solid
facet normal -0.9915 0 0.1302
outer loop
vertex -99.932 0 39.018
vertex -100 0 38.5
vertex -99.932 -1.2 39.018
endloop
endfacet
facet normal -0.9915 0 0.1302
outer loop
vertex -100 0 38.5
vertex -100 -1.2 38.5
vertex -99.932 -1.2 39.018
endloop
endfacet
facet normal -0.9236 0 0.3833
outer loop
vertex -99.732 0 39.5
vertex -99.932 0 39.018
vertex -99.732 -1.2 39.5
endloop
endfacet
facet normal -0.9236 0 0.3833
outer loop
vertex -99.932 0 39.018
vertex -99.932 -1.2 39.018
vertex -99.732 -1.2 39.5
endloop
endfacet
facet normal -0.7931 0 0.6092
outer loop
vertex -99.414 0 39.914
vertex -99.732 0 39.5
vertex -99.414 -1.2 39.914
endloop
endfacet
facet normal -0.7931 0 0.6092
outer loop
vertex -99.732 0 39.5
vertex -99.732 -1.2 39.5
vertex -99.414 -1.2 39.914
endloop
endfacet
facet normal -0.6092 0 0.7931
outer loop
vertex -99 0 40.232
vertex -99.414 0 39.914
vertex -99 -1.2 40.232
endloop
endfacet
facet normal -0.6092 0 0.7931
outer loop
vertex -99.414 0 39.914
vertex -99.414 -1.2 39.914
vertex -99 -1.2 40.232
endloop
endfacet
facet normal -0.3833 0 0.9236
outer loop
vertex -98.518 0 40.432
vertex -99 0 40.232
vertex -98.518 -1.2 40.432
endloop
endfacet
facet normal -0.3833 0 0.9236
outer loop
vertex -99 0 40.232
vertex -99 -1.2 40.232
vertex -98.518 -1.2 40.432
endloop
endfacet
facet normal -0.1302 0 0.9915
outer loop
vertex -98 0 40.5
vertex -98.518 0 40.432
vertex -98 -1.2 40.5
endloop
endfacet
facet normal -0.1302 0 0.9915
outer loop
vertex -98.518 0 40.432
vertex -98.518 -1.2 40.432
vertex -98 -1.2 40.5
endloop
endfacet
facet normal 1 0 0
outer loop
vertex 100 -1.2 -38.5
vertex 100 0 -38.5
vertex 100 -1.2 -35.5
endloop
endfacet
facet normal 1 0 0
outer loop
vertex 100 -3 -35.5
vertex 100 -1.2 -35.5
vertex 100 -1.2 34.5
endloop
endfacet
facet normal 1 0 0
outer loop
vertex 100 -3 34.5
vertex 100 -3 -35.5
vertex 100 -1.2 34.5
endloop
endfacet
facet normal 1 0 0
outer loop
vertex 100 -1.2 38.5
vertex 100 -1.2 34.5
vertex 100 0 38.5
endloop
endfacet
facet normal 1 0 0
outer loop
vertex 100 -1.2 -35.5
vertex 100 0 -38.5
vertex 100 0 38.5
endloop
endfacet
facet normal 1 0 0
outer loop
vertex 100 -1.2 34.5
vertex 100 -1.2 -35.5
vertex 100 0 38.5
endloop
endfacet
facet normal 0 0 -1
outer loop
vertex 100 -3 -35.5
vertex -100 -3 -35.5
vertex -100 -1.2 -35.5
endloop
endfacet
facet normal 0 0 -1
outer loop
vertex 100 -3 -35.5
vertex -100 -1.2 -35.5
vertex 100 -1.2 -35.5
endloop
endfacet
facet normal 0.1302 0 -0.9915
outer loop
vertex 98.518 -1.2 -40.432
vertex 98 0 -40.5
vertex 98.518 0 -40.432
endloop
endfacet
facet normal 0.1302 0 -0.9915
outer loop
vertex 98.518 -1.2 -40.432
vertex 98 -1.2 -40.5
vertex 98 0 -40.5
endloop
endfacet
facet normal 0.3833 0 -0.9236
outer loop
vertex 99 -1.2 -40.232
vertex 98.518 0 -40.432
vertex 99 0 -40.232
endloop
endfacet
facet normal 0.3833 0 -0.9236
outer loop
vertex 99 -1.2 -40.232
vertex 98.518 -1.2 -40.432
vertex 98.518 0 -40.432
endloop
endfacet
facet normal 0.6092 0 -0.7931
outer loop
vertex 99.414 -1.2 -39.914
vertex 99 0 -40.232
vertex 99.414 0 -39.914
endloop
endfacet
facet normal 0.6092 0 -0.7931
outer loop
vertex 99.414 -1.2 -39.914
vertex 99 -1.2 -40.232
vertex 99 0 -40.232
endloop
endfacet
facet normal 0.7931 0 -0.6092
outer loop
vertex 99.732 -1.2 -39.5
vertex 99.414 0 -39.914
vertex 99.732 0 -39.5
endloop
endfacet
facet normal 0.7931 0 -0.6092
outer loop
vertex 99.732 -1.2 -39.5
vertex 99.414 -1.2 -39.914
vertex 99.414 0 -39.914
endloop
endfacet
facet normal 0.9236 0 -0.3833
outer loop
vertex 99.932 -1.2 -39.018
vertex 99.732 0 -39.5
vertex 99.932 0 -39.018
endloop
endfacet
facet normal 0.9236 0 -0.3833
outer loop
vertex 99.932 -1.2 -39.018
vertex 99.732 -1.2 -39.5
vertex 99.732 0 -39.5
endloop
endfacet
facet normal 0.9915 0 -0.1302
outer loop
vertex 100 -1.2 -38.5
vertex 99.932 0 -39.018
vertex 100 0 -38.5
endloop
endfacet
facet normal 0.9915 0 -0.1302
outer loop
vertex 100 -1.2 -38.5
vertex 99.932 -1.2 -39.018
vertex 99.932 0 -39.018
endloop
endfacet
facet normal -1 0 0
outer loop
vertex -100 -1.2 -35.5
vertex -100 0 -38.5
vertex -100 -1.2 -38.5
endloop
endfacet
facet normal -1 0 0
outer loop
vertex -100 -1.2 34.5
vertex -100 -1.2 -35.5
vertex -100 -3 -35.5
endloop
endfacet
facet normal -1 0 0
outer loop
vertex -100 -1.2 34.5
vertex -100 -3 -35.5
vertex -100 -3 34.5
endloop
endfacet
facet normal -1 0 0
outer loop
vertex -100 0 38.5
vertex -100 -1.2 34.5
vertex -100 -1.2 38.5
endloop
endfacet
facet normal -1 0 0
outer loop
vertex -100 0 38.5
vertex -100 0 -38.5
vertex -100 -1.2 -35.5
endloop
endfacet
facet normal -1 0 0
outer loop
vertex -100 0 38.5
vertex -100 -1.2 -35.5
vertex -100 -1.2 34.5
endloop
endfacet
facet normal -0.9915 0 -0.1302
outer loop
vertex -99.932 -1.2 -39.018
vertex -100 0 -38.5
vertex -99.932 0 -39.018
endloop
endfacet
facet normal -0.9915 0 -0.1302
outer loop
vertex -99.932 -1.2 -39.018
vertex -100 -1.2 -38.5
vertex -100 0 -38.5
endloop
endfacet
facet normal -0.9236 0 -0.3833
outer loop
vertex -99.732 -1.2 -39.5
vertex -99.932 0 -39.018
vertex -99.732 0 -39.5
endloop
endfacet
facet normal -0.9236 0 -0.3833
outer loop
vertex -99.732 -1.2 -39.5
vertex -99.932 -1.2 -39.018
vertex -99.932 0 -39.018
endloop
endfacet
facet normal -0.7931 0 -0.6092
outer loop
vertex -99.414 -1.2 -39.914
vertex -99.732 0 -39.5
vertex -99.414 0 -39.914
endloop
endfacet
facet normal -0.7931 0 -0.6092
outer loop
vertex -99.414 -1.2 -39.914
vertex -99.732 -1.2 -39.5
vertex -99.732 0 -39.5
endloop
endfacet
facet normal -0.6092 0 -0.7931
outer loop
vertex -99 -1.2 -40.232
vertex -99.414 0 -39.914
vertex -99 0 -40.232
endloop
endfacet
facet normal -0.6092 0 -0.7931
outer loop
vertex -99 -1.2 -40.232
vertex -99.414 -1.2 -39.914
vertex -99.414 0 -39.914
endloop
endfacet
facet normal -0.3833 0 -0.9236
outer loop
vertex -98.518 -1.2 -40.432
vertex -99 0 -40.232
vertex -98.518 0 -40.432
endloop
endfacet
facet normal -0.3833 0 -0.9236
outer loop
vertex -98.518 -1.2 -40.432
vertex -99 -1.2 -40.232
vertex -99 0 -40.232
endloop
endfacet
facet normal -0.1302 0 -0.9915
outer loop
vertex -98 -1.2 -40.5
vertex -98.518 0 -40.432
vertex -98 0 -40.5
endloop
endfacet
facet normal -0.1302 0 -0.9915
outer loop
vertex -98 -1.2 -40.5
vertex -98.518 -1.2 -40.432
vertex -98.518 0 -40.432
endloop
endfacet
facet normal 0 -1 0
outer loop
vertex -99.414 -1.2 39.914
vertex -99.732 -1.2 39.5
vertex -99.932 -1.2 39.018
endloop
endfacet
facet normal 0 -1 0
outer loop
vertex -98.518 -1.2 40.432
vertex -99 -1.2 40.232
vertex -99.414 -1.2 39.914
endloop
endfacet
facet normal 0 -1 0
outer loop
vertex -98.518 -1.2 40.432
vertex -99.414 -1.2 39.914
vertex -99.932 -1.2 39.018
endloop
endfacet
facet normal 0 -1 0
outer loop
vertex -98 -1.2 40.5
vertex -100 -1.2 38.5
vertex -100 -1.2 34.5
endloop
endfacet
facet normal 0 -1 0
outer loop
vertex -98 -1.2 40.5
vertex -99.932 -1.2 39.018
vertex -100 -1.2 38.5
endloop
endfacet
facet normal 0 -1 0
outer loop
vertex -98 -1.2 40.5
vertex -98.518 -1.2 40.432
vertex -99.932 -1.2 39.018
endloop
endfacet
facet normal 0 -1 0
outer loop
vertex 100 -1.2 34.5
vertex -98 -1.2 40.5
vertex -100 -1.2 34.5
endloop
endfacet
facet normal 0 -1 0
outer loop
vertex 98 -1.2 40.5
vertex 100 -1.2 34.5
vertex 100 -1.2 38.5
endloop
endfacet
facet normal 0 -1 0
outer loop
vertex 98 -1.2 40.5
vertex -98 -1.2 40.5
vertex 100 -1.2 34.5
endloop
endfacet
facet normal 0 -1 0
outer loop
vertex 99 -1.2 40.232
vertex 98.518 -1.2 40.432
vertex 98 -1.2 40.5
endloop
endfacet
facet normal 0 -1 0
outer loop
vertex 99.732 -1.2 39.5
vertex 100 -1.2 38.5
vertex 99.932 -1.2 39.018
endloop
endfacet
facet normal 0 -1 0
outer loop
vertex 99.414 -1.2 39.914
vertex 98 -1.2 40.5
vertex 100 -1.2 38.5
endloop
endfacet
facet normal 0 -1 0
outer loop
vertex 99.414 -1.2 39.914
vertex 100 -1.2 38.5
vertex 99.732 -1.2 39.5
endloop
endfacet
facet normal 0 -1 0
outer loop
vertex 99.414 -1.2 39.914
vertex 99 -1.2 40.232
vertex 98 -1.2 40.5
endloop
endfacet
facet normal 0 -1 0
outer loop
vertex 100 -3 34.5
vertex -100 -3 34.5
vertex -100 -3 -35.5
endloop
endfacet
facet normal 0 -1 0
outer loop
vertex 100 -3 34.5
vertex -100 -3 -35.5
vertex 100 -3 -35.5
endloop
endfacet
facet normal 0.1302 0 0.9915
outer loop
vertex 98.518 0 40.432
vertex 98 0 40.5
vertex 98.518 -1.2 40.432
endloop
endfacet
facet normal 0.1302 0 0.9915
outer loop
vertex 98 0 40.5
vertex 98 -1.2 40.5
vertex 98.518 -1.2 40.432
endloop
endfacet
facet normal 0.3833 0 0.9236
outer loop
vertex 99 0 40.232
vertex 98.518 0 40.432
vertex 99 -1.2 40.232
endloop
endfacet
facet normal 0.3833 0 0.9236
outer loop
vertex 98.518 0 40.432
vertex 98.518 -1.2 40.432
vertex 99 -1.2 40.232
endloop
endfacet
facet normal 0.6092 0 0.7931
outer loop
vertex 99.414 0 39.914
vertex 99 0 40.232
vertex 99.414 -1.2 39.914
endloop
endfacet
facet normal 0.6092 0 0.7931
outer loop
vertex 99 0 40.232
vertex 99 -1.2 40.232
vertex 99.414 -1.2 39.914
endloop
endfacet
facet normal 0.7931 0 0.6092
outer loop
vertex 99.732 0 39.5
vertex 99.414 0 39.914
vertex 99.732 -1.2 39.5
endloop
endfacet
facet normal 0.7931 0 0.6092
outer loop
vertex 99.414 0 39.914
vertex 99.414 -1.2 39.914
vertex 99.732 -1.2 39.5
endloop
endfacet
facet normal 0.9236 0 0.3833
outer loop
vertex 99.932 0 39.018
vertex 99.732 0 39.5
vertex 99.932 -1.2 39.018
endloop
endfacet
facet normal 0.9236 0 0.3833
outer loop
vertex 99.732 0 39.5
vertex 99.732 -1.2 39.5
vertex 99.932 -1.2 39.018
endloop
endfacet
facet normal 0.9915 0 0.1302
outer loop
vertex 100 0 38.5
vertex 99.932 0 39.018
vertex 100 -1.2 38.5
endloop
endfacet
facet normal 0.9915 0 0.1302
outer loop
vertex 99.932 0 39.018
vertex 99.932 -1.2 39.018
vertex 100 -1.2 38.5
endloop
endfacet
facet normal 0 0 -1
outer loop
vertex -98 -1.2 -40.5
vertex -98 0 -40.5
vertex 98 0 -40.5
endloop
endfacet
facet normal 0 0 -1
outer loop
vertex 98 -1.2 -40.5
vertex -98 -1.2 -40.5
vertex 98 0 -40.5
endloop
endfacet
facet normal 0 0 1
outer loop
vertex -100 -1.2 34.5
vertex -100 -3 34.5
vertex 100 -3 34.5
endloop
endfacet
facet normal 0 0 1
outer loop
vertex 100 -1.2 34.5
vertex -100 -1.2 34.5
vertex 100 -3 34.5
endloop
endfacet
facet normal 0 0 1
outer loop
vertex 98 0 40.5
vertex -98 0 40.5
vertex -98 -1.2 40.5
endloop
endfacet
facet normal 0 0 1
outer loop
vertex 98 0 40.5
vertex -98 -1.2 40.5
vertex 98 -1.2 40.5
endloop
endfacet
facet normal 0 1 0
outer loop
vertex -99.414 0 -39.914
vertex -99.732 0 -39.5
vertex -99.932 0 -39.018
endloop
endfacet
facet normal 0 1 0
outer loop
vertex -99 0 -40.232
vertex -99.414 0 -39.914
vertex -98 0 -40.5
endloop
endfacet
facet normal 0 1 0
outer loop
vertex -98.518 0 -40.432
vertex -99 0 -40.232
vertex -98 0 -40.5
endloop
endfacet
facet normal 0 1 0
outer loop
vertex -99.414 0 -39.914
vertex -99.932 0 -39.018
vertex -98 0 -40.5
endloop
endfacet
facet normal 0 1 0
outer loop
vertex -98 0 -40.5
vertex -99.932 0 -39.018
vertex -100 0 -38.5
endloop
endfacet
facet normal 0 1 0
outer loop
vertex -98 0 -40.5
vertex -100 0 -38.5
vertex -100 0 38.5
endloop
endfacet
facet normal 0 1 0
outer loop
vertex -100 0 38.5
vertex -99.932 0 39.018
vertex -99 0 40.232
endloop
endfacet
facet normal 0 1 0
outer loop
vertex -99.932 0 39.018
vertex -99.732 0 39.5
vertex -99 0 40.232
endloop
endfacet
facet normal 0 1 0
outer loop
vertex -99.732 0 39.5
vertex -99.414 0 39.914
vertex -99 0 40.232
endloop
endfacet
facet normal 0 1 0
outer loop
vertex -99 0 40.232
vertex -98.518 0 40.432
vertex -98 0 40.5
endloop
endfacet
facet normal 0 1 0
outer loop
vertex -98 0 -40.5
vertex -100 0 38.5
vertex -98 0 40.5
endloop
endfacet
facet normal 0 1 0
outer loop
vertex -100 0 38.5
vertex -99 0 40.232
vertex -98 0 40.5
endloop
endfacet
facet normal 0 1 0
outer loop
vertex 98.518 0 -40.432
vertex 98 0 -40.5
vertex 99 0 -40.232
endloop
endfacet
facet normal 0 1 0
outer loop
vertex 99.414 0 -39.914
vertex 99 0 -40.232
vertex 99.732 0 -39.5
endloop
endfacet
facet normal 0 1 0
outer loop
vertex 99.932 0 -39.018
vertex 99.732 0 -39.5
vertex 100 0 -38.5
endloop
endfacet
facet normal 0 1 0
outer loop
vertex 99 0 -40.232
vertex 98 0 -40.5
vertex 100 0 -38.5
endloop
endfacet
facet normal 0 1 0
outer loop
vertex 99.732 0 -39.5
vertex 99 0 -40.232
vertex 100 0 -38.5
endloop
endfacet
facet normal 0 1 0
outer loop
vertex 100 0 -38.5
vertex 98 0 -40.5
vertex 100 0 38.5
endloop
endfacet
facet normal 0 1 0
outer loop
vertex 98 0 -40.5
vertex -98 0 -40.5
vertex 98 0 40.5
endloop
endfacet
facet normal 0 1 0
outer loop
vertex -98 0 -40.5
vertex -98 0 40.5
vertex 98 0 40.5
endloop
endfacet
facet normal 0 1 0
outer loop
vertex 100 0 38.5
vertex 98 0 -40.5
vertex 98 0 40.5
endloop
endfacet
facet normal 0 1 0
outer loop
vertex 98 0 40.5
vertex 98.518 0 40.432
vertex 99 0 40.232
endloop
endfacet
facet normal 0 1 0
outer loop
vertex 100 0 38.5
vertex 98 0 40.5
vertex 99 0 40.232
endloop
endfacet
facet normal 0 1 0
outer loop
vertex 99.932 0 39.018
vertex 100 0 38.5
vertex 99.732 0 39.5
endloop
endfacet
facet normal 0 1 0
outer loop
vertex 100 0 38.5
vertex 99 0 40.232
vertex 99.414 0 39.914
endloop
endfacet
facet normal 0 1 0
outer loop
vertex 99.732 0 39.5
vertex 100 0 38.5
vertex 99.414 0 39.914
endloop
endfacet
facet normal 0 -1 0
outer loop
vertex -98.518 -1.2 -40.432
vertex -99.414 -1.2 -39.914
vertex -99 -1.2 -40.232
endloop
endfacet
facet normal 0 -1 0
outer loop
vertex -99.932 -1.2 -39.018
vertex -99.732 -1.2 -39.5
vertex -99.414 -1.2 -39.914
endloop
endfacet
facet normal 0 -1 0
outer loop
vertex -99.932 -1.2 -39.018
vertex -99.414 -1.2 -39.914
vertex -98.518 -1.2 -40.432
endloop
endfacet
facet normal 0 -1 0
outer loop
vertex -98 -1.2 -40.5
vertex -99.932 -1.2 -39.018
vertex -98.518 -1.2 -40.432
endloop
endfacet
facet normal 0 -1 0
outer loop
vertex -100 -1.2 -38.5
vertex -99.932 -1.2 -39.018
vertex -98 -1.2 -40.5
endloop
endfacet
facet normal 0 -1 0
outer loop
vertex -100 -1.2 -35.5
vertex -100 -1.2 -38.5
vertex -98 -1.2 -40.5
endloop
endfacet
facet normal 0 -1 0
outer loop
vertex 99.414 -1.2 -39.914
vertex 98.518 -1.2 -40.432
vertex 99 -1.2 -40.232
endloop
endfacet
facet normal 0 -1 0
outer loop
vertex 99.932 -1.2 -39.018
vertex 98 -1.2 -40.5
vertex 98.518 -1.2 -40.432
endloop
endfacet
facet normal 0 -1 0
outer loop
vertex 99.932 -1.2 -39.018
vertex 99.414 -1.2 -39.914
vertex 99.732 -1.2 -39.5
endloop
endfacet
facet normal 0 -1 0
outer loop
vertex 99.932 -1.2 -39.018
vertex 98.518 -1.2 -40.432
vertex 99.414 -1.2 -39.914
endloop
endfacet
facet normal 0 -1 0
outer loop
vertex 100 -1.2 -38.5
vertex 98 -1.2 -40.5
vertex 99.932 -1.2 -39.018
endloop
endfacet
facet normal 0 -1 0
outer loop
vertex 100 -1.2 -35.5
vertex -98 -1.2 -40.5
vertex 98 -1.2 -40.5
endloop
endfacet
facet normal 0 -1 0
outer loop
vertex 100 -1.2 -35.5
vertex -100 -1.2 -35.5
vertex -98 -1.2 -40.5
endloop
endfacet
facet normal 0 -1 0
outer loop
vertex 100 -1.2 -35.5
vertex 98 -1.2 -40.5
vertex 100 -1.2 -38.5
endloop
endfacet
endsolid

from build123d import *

# Parameters (mm, degrees)
F0_W     = 200
F0_H     = 81
F1_DEPTH = 3
F2_W     = 200
F2_H     = 6
F2_H_2   = 5
F3_DEPTH = 1.8
F4_R     = 2


with BuildPart() as f1:
    # F0 (on Front) → F1 (new body)
    with BuildSketch(Plane.XZ):
        Rectangle(F0_W, F0_H)
    extrude(amount=F1_DEPTH)

    # F2 (on face) → F3 (cut)
    with BuildSketch(Plane.XZ.offset(3)):
        with Locations((0, 37.5)):
            Rectangle(F2_W, F2_H)
        with Locations((0, -38)):
            Rectangle(F2_W, F2_H_2)
    extrude(amount=-F3_DEPTH, mode=Mode.SUBTRACT)

    # F4
    f4_edges = [f1.edges().sort_by_distance(p)[0] for p in [
        (-100, -0.6, -40.5),
        (-100, -0.6, 40.5),
        (100, -0.6, -40.5),
        (100, -0.6, 40.5),
    ]]
    fillet(f4_edges, radius=F4_R)


solid = f1.part
